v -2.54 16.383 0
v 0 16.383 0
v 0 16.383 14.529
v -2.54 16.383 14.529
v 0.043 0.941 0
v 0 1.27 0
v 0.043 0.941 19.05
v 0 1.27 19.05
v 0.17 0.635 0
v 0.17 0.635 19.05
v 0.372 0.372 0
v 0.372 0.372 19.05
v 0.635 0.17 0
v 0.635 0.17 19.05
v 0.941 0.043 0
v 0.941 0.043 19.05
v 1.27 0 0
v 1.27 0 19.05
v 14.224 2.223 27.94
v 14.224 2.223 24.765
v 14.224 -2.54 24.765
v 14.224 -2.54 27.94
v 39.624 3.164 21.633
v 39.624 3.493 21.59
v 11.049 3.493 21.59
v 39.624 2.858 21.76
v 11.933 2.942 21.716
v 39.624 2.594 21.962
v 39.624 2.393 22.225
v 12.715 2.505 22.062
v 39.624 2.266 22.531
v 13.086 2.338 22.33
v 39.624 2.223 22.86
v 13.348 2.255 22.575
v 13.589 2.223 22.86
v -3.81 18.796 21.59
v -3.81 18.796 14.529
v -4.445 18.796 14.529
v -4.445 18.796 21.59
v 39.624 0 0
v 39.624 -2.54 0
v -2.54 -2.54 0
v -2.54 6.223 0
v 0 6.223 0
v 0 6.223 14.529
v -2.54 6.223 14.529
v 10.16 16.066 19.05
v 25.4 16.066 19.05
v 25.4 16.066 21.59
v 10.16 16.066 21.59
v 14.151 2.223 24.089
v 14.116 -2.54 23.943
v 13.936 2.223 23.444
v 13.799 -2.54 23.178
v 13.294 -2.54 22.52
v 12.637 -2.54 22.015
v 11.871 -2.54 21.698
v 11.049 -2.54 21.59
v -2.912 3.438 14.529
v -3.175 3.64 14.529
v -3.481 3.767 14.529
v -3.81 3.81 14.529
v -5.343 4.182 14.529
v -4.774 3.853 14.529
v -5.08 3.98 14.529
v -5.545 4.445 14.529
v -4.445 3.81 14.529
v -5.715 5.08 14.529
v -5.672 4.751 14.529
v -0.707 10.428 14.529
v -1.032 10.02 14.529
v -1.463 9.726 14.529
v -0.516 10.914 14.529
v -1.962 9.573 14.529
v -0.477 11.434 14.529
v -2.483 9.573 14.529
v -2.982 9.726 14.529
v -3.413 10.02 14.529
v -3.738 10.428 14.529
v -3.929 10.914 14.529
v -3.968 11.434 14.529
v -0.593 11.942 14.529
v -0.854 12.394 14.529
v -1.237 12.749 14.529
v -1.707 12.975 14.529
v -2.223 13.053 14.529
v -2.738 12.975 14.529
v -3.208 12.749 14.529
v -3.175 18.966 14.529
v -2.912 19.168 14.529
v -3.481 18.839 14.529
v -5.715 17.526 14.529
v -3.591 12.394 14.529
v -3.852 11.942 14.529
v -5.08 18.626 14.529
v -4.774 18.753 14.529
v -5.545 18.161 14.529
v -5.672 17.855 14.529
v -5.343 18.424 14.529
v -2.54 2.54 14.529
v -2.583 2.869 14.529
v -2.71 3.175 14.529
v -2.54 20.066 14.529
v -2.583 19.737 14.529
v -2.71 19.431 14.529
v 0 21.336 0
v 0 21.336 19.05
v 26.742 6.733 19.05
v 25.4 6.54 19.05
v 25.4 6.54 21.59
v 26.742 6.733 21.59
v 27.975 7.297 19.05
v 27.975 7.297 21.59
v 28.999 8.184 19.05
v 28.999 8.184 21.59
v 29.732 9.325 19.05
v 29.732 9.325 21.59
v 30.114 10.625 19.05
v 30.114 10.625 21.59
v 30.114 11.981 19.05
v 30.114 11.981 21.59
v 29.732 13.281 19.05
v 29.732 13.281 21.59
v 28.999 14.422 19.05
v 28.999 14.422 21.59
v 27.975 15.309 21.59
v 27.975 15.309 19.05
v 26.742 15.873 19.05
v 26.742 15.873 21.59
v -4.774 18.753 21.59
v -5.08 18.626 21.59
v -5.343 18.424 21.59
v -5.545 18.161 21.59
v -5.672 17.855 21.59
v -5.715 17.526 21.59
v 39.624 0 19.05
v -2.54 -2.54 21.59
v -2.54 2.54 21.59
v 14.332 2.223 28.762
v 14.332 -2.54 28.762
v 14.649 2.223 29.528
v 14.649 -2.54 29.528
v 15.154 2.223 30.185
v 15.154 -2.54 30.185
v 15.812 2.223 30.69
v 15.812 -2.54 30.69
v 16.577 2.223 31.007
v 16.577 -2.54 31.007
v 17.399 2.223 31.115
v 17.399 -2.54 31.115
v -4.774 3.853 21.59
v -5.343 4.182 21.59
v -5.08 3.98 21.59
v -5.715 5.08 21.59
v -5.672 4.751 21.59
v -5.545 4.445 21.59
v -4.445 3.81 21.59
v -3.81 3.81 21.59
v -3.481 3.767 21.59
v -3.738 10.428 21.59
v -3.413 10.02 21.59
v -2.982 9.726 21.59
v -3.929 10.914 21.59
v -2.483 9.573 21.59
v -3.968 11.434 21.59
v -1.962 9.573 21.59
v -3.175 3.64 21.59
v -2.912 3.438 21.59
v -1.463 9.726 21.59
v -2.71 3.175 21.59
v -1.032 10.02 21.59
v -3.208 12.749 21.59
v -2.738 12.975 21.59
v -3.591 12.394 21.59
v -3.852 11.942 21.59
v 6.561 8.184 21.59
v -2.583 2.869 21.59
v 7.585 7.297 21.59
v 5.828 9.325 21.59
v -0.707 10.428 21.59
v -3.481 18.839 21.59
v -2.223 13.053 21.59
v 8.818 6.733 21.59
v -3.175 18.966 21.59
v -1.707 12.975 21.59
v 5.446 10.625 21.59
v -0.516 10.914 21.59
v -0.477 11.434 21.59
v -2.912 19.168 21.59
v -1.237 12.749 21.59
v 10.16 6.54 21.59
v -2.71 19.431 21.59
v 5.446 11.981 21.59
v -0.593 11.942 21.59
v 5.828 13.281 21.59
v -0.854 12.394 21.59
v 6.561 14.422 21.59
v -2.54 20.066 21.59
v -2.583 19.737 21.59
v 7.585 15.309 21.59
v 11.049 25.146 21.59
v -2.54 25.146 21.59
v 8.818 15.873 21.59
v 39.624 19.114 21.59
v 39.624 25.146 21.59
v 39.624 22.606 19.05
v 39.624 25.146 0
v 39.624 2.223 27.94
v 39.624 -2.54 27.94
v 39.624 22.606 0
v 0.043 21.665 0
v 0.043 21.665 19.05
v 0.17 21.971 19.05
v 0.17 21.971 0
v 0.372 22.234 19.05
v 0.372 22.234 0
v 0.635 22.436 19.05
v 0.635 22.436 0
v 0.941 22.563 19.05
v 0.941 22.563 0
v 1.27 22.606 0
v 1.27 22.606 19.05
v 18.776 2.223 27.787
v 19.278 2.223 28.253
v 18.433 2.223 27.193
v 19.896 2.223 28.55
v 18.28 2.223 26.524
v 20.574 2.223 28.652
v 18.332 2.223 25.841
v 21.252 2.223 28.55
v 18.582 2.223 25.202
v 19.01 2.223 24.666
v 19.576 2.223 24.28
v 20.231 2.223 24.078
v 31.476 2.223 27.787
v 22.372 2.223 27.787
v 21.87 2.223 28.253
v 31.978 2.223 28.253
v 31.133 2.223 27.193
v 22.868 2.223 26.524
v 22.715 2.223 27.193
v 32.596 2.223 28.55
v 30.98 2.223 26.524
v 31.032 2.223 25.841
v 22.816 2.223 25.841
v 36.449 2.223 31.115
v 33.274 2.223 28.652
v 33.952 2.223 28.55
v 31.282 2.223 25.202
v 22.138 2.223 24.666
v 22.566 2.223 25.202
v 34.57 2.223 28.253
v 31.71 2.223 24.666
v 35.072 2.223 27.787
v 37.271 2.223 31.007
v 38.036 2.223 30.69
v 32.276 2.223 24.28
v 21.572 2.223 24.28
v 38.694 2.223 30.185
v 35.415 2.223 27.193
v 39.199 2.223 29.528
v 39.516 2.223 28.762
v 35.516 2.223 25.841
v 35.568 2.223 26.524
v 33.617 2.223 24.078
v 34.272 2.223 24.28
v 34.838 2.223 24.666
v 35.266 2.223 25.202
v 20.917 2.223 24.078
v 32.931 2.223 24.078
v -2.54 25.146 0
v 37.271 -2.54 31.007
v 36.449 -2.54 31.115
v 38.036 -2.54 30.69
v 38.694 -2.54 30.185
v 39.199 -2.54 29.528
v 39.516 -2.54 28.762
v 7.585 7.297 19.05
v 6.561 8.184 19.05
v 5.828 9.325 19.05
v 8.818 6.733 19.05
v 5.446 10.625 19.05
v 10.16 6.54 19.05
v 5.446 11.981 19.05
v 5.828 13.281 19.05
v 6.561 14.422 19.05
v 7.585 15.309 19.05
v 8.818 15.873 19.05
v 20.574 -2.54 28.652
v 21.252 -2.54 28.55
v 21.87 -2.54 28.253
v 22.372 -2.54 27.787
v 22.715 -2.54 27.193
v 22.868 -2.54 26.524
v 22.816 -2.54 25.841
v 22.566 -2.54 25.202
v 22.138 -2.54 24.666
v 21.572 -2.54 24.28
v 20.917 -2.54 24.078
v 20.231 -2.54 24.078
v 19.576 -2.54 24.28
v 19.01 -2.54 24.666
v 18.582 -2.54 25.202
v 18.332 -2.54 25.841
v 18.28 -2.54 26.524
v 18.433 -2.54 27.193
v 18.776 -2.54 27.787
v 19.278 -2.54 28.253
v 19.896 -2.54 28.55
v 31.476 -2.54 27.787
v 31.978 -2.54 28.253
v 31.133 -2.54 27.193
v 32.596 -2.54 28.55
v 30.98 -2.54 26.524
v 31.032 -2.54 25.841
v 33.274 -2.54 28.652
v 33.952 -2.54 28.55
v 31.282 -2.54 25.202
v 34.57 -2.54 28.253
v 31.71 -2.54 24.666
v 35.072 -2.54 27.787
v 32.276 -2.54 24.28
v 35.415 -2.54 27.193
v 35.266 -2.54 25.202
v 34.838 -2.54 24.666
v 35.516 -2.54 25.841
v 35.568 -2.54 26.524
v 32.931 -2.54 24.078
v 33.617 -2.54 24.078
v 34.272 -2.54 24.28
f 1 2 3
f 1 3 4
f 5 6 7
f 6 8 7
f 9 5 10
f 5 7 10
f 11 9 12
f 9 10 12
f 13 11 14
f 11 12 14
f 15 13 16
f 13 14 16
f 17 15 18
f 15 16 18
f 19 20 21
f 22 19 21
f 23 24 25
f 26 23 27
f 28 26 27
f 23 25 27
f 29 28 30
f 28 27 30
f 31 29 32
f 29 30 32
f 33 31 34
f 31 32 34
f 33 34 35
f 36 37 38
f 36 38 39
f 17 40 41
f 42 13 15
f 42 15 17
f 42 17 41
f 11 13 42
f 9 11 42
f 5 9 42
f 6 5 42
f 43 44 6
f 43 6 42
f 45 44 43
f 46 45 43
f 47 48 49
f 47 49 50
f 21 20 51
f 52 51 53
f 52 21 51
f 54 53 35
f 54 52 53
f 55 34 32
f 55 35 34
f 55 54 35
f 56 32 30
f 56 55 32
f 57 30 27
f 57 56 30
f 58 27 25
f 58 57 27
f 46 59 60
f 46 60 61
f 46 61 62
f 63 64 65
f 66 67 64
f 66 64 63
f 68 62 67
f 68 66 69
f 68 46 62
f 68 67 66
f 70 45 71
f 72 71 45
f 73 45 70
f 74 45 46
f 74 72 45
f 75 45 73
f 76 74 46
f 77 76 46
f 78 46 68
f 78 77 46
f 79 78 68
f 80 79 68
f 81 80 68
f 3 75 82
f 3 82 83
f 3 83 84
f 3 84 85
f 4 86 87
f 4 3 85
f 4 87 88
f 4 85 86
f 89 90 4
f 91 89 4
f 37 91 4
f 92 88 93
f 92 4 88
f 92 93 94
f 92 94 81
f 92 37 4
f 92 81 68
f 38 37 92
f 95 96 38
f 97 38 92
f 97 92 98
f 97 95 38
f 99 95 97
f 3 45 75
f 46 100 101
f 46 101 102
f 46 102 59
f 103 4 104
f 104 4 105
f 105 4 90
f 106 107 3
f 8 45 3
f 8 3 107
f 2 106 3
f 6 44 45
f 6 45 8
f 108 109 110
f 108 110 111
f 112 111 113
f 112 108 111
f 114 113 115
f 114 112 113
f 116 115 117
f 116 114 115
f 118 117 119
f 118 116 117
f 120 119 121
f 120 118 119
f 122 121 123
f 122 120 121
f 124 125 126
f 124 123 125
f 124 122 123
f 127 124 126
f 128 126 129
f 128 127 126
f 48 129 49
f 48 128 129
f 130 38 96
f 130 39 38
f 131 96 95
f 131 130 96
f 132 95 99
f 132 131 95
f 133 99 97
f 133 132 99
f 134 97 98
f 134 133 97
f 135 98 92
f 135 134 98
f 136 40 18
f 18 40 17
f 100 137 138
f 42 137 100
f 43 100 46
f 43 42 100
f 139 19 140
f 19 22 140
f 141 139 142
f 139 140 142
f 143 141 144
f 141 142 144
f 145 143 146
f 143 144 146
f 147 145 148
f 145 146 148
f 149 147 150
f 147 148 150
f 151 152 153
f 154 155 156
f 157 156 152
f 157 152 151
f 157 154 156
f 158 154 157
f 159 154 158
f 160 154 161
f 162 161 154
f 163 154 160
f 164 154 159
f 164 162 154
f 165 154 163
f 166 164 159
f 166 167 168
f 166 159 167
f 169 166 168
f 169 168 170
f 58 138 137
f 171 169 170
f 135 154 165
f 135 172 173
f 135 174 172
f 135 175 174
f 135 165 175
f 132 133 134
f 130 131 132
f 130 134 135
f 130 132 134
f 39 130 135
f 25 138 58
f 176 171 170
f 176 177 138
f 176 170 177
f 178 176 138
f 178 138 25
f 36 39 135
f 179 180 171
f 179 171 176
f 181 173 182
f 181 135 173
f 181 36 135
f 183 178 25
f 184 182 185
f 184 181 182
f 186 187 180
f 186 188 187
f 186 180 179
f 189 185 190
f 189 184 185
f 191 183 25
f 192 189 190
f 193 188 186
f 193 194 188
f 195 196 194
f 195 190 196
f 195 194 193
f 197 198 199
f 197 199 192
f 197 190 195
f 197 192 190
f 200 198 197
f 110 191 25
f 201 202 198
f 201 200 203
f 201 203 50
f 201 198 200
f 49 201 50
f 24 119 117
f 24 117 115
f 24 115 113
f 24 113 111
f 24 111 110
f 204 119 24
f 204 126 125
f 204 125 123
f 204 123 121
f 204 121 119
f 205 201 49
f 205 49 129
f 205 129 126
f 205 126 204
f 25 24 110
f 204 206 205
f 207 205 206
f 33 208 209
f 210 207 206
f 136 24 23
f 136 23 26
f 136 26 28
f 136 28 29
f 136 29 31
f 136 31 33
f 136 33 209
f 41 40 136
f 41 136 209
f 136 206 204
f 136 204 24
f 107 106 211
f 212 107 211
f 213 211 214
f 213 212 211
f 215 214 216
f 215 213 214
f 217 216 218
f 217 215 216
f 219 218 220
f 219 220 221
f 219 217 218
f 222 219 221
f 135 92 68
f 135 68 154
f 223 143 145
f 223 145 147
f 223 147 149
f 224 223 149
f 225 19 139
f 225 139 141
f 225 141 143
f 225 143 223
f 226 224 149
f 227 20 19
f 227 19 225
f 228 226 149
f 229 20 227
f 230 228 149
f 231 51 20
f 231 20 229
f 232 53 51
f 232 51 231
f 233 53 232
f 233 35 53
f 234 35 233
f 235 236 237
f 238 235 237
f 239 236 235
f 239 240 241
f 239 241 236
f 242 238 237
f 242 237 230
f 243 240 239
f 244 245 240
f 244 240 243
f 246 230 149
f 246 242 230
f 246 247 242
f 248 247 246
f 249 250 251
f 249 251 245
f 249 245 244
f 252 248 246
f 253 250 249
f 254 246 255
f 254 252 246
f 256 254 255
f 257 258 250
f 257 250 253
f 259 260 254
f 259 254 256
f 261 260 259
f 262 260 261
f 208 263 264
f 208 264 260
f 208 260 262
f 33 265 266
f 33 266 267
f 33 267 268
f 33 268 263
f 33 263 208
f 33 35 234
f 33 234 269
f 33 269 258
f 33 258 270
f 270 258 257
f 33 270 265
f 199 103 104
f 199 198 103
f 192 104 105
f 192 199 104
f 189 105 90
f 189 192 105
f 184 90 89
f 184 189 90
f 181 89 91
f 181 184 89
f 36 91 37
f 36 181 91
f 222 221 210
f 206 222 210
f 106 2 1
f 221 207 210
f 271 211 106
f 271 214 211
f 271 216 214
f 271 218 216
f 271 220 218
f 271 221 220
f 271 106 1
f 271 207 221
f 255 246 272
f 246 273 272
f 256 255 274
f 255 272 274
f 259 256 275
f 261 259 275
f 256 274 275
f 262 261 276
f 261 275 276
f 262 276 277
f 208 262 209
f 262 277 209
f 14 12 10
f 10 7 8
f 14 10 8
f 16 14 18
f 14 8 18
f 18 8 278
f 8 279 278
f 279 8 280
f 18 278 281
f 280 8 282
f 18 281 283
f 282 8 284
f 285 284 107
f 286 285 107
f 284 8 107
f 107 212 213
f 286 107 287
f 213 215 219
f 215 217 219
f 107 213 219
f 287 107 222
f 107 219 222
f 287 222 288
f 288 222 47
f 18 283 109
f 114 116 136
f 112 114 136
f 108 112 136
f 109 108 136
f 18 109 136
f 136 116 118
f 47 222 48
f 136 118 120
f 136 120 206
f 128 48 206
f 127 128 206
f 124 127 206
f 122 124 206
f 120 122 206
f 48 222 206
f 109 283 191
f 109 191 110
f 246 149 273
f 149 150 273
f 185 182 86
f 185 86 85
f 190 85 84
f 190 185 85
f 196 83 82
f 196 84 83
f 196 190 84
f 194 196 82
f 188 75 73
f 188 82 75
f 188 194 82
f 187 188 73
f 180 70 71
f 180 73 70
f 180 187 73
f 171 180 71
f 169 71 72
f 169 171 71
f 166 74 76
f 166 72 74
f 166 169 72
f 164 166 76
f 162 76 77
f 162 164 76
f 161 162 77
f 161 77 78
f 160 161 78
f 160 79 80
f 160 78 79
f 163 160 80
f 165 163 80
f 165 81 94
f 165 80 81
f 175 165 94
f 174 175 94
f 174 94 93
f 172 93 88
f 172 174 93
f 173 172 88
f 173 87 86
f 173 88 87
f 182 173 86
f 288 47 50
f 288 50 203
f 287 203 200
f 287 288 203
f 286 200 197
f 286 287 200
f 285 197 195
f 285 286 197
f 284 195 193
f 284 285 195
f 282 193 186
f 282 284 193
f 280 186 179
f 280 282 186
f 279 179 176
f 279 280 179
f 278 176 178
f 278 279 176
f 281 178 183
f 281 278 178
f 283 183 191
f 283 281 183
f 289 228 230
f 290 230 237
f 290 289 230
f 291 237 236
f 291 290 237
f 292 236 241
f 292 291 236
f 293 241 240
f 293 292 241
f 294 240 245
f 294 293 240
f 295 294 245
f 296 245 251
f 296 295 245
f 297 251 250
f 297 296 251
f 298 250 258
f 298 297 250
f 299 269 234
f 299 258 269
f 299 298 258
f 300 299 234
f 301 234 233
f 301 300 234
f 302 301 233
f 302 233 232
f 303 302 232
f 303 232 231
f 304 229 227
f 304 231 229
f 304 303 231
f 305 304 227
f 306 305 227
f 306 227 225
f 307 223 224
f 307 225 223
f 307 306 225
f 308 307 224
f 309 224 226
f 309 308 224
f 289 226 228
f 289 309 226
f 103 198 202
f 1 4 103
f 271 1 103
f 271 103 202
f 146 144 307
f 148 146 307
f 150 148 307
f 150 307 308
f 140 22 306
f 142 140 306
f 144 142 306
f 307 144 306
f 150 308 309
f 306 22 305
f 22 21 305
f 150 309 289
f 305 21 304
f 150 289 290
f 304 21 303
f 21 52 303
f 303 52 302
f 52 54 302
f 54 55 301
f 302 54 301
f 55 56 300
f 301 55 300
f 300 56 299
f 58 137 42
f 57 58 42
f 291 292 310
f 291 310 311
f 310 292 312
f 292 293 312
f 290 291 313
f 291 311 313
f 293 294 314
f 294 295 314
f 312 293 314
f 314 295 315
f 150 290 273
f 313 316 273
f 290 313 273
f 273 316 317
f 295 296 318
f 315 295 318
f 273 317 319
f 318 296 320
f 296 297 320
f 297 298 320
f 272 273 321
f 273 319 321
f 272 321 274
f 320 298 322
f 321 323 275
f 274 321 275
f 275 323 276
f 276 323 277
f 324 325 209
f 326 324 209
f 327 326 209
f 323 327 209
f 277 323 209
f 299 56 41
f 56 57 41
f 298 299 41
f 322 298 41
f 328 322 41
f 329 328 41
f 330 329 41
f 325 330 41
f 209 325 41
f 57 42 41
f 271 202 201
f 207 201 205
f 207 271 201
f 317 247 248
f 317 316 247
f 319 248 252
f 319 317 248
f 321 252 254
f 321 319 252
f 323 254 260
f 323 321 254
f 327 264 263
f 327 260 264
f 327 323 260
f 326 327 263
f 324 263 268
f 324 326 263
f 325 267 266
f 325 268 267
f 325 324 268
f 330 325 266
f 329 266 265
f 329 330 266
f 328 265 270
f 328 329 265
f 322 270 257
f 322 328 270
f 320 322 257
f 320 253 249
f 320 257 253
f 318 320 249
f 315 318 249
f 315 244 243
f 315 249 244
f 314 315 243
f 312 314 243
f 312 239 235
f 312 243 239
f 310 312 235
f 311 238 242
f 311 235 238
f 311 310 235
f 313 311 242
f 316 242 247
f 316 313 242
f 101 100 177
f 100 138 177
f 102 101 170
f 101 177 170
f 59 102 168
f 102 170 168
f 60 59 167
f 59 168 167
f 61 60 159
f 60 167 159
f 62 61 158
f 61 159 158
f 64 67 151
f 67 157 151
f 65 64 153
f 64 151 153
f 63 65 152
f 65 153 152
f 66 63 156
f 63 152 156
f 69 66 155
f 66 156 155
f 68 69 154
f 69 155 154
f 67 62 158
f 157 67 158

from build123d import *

# Parameters (mm, degrees)
BOSS_EXTRUDE1_DEPTH     = 19.05
SKETCH2_W               = 42.164
SKETCH2_H               = 27.686
BOSS_EXTRUDE2_DEPTH     = 2.54
SKETCH3_W               = 7.0612
SKETCH3_H               = 14.986
BOSS_EXTRUDE3_DEPTH     = 3.175
CUT_EXTRUDE1_DEPTH      = 50.127067096
CUT_EXTRUDE1_DEPTH_BACK = 50.127067096
SKETCH4_R               = 1.75
FILLET2_R               = 1.27
CUT_EXTRUDE2_DEPTH      = 52.65763053
CUT_EXTRUDE2_DEPTH_BACK = 52.65763053
SKETCH5_R               = 4.7625
SKETCH6_W               = 25.4
SKETCH6_H               = 4.7625
BOSS_EXTRUDE4_DEPTH     = 9.525
FILLET3_R               = 3.175
FILLET4_R               = 1.27
FILLET6_R               = 1.27
SKETCH8_R               = 2.3
CUT_EXTRUDE3_DEPTH      = 58.486687197
SKETCH9_W               = 2.54
SKETCH9_H               = 10.16
CUT_EXTRUDE4_DEPTH      = 14.5288
FILLET3_OF_MIRROR2_R    = 3.175
FILLET4_OF_MIRROR2_R    = 1.27
SKETCH11_W              = 43.835439061
SKETCH11_H              = 10.898597795
CUT_EXTRUDE5_DEPTH      = 6.858


with BuildPart() as part:
    # Sketch1 → Boss-Extrude1 (new body)
    with BuildSketch(Plane.XY):
        Polygon((-2.54, 25.146), (39.624, 25.146), (39.624, 22.606), (37.084, 22.606), (0, 22.606), (0, 0), (37.084, 0), (39.624, 0), (39.624, -2.54), (-2.54, -2.54), align=None)
    extrude(amount=BOSS_EXTRUDE1_DEPTH)

    # Sketch2 → Boss-Extrude2 (add)
    with BuildSketch(Plane.XY.offset(19.05)):
        with Locations((18.542, 11.303)):
            Rectangle(SKETCH2_W, SKETCH2_H)
    extrude(amount=BOSS_EXTRUDE2_DEPTH)

    # Sketch3 → Boss-Extrude3 (add)
    with BuildSketch(Plane.ZY.offset(2.54)):
        with Locations((18.0594, 11.303)):
            Rectangle(SKETCH3_W, SKETCH3_H)
    extrude(amount=BOSS_EXTRUDE3_DEPTH)

    # Sketch4 → Cut-Extrude1 (cut, two sides: drawn at the far end of the back side and taken through both)
    with BuildSketch(Plane(origin=(0, 0, 14.5288), x_dir=(-1, 0, 0), z_dir=(0, 0, -1)).offset(-CUT_EXTRUDE1_DEPTH_BACK)):
        with Locations(Location((2.2225, 11.303, 0), (0, 0, 90))):
            Circle(SKETCH4_R)
    extrude(amount=CUT_EXTRUDE1_DEPTH + CUT_EXTRUDE1_DEPTH_BACK, mode=Mode.SUBTRACT)

    # Fillet2
    fillet2_edges = [part.edges().sort_by_distance(p)[0] for p in [
        (-2.54, 18.796, 18.0594),
        (-2.54, 3.81, 18.0594),
        (-5.715, 18.796, 18.0594),
        (-5.715, 3.81, 18.0594),
    ]]
    fillet(fillet2_edges, radius=FILLET2_R)

    # Sketch5 → Cut-Extrude2 (cut, two sides: drawn at the far end of the back side and taken through both)
    with BuildSketch(Plane.XY.offset(21.59).offset(-CUT_EXTRUDE2_DEPTH_BACK)):
        with Locations((10.16, 11.303)):
            Circle(SKETCH5_R)
        with BuildLine():
            Line((25.4, 16.0655), (10.16, 16.0655))
            ThreePointArc((10.16, 16.0655), (13.527596045, 14.670596045), (14.9225, 11.303))
            ThreePointArc((14.9225, 11.303), (13.527596045, 7.935403955), (10.16, 6.5405))
            Line((10.16, 6.5405), (25.4, 6.5405))
            ThreePointArc((25.4, 6.5405), (20.6375, 11.303), (25.4, 16.0655))
        make_face()
        with Locations((25.4, 11.303)):
            Circle(SKETCH5_R)
    extrude(amount=CUT_EXTRUDE2_DEPTH + CUT_EXTRUDE2_DEPTH_BACK, mode=Mode.SUBTRACT)

    # Sketch6 → Boss-Extrude4 (add)
    with BuildSketch(Plane.XY.offset(21.59)):
        with Locations((26.924, 22.76475)):
            Rectangle(SKETCH6_W, SKETCH6_H)
    boss_extrude4 = extrude(amount=BOSS_EXTRUDE4_DEPTH)

    # Fillet3
    fillet3_edges = [part.edges().sort_by_distance(p)[0] for p in [
        (14.224, 22.76475, 21.59),
        (14.224, 22.76475, 31.115),
        (39.624, 22.76475, 31.115),
    ]]
    fillet(fillet3_edges, radius=FILLET3_R)

    # Fillet4
    fillet4_edges = [part.edges().sort_by_distance(p)[0] for p in [
        (25.3365, 20.3835, 21.59),
    ]]
    fillet(fillet4_edges, radius=FILLET4_R)

    # Fillet6
    fillet6_edges = [part.edges().sort_by_distance(p)[0] for p in [
        (0, 0, 9.525),
        (0, 22.606, 9.525),
    ]]
    fillet(fillet6_edges, radius=FILLET6_R)

    # Sketch8 → Cut-Extrude3 (cut, symmetric)
    with BuildSketch(Plane(origin=(0, 25.146, 0), x_dir=(1, 0, 0), z_dir=(0, 1, 0))):
        with Locations(Location((20.574, -26.3525, 0), (0, 0, 270))):
            Circle(SKETCH8_R)
        with Locations(Location((33.274, -26.3525, 0), (0, 0, 270))):
            Circle(SKETCH8_R)
    cut_extrude3 = extrude(amount=CUT_EXTRUDE3_DEPTH, both=True, mode=Mode.SUBTRACT)

    # Sketch9 → Cut-Extrude4 (cut)
    with BuildSketch(Plane(origin=(0, 0, 0), x_dir=(-1, 0, 0), z_dir=(0, 0, -1))):
        with Locations((1.27, 11.303)):
            Rectangle(SKETCH9_W, SKETCH9_H)
    extrude(amount=-CUT_EXTRUDE4_DEPTH, mode=Mode.SUBTRACT)

    # Mirror2: Boss-Extrude4, Cut-Extrude3 across plane
    add(boss_extrude4.mirror(Plane.ZX.offset(11.303)))
    add(cut_extrude3.mirror(Plane.ZX.offset(11.303)), mode=Mode.SUBTRACT)

    # Fillet3 of Mirror2
    fillet3_of_mirror2_edges = [part.edges().sort_by_distance(p)[0] for p in [
        (14.224, -0.15875, 21.59),
        (14.224, -0.15875, 31.115),
        (39.624, -0.15875, 31.115),
    ]]
    fillet(fillet3_of_mirror2_edges, radius=FILLET3_OF_MIRROR2_R)

    # Fillet4 of Mirror2
    fillet4_of_mirror2_edges = [part.edges().sort_by_distance(p)[0] for p in [
        (25.3365, 2.2225, 21.59),
    ]]
    fillet(fillet4_of_mirror2_edges, radius=FILLET4_OF_MIRROR2_R)

    # Sketch11 → Cut-Extrude5 (cut)
    with BuildSketch(Plane(origin=(0, 25.146, 0), x_dir=(1, 0, 0), z_dir=(0, 1, 0))):
        with Locations((19.377719531, -27.039298898)):
            Rectangle(SKETCH11_W, SKETCH11_H)
    extrude(amount=-CUT_EXTRUDE5_DEPTH, mode=Mode.SUBTRACT)


solid = part.part
